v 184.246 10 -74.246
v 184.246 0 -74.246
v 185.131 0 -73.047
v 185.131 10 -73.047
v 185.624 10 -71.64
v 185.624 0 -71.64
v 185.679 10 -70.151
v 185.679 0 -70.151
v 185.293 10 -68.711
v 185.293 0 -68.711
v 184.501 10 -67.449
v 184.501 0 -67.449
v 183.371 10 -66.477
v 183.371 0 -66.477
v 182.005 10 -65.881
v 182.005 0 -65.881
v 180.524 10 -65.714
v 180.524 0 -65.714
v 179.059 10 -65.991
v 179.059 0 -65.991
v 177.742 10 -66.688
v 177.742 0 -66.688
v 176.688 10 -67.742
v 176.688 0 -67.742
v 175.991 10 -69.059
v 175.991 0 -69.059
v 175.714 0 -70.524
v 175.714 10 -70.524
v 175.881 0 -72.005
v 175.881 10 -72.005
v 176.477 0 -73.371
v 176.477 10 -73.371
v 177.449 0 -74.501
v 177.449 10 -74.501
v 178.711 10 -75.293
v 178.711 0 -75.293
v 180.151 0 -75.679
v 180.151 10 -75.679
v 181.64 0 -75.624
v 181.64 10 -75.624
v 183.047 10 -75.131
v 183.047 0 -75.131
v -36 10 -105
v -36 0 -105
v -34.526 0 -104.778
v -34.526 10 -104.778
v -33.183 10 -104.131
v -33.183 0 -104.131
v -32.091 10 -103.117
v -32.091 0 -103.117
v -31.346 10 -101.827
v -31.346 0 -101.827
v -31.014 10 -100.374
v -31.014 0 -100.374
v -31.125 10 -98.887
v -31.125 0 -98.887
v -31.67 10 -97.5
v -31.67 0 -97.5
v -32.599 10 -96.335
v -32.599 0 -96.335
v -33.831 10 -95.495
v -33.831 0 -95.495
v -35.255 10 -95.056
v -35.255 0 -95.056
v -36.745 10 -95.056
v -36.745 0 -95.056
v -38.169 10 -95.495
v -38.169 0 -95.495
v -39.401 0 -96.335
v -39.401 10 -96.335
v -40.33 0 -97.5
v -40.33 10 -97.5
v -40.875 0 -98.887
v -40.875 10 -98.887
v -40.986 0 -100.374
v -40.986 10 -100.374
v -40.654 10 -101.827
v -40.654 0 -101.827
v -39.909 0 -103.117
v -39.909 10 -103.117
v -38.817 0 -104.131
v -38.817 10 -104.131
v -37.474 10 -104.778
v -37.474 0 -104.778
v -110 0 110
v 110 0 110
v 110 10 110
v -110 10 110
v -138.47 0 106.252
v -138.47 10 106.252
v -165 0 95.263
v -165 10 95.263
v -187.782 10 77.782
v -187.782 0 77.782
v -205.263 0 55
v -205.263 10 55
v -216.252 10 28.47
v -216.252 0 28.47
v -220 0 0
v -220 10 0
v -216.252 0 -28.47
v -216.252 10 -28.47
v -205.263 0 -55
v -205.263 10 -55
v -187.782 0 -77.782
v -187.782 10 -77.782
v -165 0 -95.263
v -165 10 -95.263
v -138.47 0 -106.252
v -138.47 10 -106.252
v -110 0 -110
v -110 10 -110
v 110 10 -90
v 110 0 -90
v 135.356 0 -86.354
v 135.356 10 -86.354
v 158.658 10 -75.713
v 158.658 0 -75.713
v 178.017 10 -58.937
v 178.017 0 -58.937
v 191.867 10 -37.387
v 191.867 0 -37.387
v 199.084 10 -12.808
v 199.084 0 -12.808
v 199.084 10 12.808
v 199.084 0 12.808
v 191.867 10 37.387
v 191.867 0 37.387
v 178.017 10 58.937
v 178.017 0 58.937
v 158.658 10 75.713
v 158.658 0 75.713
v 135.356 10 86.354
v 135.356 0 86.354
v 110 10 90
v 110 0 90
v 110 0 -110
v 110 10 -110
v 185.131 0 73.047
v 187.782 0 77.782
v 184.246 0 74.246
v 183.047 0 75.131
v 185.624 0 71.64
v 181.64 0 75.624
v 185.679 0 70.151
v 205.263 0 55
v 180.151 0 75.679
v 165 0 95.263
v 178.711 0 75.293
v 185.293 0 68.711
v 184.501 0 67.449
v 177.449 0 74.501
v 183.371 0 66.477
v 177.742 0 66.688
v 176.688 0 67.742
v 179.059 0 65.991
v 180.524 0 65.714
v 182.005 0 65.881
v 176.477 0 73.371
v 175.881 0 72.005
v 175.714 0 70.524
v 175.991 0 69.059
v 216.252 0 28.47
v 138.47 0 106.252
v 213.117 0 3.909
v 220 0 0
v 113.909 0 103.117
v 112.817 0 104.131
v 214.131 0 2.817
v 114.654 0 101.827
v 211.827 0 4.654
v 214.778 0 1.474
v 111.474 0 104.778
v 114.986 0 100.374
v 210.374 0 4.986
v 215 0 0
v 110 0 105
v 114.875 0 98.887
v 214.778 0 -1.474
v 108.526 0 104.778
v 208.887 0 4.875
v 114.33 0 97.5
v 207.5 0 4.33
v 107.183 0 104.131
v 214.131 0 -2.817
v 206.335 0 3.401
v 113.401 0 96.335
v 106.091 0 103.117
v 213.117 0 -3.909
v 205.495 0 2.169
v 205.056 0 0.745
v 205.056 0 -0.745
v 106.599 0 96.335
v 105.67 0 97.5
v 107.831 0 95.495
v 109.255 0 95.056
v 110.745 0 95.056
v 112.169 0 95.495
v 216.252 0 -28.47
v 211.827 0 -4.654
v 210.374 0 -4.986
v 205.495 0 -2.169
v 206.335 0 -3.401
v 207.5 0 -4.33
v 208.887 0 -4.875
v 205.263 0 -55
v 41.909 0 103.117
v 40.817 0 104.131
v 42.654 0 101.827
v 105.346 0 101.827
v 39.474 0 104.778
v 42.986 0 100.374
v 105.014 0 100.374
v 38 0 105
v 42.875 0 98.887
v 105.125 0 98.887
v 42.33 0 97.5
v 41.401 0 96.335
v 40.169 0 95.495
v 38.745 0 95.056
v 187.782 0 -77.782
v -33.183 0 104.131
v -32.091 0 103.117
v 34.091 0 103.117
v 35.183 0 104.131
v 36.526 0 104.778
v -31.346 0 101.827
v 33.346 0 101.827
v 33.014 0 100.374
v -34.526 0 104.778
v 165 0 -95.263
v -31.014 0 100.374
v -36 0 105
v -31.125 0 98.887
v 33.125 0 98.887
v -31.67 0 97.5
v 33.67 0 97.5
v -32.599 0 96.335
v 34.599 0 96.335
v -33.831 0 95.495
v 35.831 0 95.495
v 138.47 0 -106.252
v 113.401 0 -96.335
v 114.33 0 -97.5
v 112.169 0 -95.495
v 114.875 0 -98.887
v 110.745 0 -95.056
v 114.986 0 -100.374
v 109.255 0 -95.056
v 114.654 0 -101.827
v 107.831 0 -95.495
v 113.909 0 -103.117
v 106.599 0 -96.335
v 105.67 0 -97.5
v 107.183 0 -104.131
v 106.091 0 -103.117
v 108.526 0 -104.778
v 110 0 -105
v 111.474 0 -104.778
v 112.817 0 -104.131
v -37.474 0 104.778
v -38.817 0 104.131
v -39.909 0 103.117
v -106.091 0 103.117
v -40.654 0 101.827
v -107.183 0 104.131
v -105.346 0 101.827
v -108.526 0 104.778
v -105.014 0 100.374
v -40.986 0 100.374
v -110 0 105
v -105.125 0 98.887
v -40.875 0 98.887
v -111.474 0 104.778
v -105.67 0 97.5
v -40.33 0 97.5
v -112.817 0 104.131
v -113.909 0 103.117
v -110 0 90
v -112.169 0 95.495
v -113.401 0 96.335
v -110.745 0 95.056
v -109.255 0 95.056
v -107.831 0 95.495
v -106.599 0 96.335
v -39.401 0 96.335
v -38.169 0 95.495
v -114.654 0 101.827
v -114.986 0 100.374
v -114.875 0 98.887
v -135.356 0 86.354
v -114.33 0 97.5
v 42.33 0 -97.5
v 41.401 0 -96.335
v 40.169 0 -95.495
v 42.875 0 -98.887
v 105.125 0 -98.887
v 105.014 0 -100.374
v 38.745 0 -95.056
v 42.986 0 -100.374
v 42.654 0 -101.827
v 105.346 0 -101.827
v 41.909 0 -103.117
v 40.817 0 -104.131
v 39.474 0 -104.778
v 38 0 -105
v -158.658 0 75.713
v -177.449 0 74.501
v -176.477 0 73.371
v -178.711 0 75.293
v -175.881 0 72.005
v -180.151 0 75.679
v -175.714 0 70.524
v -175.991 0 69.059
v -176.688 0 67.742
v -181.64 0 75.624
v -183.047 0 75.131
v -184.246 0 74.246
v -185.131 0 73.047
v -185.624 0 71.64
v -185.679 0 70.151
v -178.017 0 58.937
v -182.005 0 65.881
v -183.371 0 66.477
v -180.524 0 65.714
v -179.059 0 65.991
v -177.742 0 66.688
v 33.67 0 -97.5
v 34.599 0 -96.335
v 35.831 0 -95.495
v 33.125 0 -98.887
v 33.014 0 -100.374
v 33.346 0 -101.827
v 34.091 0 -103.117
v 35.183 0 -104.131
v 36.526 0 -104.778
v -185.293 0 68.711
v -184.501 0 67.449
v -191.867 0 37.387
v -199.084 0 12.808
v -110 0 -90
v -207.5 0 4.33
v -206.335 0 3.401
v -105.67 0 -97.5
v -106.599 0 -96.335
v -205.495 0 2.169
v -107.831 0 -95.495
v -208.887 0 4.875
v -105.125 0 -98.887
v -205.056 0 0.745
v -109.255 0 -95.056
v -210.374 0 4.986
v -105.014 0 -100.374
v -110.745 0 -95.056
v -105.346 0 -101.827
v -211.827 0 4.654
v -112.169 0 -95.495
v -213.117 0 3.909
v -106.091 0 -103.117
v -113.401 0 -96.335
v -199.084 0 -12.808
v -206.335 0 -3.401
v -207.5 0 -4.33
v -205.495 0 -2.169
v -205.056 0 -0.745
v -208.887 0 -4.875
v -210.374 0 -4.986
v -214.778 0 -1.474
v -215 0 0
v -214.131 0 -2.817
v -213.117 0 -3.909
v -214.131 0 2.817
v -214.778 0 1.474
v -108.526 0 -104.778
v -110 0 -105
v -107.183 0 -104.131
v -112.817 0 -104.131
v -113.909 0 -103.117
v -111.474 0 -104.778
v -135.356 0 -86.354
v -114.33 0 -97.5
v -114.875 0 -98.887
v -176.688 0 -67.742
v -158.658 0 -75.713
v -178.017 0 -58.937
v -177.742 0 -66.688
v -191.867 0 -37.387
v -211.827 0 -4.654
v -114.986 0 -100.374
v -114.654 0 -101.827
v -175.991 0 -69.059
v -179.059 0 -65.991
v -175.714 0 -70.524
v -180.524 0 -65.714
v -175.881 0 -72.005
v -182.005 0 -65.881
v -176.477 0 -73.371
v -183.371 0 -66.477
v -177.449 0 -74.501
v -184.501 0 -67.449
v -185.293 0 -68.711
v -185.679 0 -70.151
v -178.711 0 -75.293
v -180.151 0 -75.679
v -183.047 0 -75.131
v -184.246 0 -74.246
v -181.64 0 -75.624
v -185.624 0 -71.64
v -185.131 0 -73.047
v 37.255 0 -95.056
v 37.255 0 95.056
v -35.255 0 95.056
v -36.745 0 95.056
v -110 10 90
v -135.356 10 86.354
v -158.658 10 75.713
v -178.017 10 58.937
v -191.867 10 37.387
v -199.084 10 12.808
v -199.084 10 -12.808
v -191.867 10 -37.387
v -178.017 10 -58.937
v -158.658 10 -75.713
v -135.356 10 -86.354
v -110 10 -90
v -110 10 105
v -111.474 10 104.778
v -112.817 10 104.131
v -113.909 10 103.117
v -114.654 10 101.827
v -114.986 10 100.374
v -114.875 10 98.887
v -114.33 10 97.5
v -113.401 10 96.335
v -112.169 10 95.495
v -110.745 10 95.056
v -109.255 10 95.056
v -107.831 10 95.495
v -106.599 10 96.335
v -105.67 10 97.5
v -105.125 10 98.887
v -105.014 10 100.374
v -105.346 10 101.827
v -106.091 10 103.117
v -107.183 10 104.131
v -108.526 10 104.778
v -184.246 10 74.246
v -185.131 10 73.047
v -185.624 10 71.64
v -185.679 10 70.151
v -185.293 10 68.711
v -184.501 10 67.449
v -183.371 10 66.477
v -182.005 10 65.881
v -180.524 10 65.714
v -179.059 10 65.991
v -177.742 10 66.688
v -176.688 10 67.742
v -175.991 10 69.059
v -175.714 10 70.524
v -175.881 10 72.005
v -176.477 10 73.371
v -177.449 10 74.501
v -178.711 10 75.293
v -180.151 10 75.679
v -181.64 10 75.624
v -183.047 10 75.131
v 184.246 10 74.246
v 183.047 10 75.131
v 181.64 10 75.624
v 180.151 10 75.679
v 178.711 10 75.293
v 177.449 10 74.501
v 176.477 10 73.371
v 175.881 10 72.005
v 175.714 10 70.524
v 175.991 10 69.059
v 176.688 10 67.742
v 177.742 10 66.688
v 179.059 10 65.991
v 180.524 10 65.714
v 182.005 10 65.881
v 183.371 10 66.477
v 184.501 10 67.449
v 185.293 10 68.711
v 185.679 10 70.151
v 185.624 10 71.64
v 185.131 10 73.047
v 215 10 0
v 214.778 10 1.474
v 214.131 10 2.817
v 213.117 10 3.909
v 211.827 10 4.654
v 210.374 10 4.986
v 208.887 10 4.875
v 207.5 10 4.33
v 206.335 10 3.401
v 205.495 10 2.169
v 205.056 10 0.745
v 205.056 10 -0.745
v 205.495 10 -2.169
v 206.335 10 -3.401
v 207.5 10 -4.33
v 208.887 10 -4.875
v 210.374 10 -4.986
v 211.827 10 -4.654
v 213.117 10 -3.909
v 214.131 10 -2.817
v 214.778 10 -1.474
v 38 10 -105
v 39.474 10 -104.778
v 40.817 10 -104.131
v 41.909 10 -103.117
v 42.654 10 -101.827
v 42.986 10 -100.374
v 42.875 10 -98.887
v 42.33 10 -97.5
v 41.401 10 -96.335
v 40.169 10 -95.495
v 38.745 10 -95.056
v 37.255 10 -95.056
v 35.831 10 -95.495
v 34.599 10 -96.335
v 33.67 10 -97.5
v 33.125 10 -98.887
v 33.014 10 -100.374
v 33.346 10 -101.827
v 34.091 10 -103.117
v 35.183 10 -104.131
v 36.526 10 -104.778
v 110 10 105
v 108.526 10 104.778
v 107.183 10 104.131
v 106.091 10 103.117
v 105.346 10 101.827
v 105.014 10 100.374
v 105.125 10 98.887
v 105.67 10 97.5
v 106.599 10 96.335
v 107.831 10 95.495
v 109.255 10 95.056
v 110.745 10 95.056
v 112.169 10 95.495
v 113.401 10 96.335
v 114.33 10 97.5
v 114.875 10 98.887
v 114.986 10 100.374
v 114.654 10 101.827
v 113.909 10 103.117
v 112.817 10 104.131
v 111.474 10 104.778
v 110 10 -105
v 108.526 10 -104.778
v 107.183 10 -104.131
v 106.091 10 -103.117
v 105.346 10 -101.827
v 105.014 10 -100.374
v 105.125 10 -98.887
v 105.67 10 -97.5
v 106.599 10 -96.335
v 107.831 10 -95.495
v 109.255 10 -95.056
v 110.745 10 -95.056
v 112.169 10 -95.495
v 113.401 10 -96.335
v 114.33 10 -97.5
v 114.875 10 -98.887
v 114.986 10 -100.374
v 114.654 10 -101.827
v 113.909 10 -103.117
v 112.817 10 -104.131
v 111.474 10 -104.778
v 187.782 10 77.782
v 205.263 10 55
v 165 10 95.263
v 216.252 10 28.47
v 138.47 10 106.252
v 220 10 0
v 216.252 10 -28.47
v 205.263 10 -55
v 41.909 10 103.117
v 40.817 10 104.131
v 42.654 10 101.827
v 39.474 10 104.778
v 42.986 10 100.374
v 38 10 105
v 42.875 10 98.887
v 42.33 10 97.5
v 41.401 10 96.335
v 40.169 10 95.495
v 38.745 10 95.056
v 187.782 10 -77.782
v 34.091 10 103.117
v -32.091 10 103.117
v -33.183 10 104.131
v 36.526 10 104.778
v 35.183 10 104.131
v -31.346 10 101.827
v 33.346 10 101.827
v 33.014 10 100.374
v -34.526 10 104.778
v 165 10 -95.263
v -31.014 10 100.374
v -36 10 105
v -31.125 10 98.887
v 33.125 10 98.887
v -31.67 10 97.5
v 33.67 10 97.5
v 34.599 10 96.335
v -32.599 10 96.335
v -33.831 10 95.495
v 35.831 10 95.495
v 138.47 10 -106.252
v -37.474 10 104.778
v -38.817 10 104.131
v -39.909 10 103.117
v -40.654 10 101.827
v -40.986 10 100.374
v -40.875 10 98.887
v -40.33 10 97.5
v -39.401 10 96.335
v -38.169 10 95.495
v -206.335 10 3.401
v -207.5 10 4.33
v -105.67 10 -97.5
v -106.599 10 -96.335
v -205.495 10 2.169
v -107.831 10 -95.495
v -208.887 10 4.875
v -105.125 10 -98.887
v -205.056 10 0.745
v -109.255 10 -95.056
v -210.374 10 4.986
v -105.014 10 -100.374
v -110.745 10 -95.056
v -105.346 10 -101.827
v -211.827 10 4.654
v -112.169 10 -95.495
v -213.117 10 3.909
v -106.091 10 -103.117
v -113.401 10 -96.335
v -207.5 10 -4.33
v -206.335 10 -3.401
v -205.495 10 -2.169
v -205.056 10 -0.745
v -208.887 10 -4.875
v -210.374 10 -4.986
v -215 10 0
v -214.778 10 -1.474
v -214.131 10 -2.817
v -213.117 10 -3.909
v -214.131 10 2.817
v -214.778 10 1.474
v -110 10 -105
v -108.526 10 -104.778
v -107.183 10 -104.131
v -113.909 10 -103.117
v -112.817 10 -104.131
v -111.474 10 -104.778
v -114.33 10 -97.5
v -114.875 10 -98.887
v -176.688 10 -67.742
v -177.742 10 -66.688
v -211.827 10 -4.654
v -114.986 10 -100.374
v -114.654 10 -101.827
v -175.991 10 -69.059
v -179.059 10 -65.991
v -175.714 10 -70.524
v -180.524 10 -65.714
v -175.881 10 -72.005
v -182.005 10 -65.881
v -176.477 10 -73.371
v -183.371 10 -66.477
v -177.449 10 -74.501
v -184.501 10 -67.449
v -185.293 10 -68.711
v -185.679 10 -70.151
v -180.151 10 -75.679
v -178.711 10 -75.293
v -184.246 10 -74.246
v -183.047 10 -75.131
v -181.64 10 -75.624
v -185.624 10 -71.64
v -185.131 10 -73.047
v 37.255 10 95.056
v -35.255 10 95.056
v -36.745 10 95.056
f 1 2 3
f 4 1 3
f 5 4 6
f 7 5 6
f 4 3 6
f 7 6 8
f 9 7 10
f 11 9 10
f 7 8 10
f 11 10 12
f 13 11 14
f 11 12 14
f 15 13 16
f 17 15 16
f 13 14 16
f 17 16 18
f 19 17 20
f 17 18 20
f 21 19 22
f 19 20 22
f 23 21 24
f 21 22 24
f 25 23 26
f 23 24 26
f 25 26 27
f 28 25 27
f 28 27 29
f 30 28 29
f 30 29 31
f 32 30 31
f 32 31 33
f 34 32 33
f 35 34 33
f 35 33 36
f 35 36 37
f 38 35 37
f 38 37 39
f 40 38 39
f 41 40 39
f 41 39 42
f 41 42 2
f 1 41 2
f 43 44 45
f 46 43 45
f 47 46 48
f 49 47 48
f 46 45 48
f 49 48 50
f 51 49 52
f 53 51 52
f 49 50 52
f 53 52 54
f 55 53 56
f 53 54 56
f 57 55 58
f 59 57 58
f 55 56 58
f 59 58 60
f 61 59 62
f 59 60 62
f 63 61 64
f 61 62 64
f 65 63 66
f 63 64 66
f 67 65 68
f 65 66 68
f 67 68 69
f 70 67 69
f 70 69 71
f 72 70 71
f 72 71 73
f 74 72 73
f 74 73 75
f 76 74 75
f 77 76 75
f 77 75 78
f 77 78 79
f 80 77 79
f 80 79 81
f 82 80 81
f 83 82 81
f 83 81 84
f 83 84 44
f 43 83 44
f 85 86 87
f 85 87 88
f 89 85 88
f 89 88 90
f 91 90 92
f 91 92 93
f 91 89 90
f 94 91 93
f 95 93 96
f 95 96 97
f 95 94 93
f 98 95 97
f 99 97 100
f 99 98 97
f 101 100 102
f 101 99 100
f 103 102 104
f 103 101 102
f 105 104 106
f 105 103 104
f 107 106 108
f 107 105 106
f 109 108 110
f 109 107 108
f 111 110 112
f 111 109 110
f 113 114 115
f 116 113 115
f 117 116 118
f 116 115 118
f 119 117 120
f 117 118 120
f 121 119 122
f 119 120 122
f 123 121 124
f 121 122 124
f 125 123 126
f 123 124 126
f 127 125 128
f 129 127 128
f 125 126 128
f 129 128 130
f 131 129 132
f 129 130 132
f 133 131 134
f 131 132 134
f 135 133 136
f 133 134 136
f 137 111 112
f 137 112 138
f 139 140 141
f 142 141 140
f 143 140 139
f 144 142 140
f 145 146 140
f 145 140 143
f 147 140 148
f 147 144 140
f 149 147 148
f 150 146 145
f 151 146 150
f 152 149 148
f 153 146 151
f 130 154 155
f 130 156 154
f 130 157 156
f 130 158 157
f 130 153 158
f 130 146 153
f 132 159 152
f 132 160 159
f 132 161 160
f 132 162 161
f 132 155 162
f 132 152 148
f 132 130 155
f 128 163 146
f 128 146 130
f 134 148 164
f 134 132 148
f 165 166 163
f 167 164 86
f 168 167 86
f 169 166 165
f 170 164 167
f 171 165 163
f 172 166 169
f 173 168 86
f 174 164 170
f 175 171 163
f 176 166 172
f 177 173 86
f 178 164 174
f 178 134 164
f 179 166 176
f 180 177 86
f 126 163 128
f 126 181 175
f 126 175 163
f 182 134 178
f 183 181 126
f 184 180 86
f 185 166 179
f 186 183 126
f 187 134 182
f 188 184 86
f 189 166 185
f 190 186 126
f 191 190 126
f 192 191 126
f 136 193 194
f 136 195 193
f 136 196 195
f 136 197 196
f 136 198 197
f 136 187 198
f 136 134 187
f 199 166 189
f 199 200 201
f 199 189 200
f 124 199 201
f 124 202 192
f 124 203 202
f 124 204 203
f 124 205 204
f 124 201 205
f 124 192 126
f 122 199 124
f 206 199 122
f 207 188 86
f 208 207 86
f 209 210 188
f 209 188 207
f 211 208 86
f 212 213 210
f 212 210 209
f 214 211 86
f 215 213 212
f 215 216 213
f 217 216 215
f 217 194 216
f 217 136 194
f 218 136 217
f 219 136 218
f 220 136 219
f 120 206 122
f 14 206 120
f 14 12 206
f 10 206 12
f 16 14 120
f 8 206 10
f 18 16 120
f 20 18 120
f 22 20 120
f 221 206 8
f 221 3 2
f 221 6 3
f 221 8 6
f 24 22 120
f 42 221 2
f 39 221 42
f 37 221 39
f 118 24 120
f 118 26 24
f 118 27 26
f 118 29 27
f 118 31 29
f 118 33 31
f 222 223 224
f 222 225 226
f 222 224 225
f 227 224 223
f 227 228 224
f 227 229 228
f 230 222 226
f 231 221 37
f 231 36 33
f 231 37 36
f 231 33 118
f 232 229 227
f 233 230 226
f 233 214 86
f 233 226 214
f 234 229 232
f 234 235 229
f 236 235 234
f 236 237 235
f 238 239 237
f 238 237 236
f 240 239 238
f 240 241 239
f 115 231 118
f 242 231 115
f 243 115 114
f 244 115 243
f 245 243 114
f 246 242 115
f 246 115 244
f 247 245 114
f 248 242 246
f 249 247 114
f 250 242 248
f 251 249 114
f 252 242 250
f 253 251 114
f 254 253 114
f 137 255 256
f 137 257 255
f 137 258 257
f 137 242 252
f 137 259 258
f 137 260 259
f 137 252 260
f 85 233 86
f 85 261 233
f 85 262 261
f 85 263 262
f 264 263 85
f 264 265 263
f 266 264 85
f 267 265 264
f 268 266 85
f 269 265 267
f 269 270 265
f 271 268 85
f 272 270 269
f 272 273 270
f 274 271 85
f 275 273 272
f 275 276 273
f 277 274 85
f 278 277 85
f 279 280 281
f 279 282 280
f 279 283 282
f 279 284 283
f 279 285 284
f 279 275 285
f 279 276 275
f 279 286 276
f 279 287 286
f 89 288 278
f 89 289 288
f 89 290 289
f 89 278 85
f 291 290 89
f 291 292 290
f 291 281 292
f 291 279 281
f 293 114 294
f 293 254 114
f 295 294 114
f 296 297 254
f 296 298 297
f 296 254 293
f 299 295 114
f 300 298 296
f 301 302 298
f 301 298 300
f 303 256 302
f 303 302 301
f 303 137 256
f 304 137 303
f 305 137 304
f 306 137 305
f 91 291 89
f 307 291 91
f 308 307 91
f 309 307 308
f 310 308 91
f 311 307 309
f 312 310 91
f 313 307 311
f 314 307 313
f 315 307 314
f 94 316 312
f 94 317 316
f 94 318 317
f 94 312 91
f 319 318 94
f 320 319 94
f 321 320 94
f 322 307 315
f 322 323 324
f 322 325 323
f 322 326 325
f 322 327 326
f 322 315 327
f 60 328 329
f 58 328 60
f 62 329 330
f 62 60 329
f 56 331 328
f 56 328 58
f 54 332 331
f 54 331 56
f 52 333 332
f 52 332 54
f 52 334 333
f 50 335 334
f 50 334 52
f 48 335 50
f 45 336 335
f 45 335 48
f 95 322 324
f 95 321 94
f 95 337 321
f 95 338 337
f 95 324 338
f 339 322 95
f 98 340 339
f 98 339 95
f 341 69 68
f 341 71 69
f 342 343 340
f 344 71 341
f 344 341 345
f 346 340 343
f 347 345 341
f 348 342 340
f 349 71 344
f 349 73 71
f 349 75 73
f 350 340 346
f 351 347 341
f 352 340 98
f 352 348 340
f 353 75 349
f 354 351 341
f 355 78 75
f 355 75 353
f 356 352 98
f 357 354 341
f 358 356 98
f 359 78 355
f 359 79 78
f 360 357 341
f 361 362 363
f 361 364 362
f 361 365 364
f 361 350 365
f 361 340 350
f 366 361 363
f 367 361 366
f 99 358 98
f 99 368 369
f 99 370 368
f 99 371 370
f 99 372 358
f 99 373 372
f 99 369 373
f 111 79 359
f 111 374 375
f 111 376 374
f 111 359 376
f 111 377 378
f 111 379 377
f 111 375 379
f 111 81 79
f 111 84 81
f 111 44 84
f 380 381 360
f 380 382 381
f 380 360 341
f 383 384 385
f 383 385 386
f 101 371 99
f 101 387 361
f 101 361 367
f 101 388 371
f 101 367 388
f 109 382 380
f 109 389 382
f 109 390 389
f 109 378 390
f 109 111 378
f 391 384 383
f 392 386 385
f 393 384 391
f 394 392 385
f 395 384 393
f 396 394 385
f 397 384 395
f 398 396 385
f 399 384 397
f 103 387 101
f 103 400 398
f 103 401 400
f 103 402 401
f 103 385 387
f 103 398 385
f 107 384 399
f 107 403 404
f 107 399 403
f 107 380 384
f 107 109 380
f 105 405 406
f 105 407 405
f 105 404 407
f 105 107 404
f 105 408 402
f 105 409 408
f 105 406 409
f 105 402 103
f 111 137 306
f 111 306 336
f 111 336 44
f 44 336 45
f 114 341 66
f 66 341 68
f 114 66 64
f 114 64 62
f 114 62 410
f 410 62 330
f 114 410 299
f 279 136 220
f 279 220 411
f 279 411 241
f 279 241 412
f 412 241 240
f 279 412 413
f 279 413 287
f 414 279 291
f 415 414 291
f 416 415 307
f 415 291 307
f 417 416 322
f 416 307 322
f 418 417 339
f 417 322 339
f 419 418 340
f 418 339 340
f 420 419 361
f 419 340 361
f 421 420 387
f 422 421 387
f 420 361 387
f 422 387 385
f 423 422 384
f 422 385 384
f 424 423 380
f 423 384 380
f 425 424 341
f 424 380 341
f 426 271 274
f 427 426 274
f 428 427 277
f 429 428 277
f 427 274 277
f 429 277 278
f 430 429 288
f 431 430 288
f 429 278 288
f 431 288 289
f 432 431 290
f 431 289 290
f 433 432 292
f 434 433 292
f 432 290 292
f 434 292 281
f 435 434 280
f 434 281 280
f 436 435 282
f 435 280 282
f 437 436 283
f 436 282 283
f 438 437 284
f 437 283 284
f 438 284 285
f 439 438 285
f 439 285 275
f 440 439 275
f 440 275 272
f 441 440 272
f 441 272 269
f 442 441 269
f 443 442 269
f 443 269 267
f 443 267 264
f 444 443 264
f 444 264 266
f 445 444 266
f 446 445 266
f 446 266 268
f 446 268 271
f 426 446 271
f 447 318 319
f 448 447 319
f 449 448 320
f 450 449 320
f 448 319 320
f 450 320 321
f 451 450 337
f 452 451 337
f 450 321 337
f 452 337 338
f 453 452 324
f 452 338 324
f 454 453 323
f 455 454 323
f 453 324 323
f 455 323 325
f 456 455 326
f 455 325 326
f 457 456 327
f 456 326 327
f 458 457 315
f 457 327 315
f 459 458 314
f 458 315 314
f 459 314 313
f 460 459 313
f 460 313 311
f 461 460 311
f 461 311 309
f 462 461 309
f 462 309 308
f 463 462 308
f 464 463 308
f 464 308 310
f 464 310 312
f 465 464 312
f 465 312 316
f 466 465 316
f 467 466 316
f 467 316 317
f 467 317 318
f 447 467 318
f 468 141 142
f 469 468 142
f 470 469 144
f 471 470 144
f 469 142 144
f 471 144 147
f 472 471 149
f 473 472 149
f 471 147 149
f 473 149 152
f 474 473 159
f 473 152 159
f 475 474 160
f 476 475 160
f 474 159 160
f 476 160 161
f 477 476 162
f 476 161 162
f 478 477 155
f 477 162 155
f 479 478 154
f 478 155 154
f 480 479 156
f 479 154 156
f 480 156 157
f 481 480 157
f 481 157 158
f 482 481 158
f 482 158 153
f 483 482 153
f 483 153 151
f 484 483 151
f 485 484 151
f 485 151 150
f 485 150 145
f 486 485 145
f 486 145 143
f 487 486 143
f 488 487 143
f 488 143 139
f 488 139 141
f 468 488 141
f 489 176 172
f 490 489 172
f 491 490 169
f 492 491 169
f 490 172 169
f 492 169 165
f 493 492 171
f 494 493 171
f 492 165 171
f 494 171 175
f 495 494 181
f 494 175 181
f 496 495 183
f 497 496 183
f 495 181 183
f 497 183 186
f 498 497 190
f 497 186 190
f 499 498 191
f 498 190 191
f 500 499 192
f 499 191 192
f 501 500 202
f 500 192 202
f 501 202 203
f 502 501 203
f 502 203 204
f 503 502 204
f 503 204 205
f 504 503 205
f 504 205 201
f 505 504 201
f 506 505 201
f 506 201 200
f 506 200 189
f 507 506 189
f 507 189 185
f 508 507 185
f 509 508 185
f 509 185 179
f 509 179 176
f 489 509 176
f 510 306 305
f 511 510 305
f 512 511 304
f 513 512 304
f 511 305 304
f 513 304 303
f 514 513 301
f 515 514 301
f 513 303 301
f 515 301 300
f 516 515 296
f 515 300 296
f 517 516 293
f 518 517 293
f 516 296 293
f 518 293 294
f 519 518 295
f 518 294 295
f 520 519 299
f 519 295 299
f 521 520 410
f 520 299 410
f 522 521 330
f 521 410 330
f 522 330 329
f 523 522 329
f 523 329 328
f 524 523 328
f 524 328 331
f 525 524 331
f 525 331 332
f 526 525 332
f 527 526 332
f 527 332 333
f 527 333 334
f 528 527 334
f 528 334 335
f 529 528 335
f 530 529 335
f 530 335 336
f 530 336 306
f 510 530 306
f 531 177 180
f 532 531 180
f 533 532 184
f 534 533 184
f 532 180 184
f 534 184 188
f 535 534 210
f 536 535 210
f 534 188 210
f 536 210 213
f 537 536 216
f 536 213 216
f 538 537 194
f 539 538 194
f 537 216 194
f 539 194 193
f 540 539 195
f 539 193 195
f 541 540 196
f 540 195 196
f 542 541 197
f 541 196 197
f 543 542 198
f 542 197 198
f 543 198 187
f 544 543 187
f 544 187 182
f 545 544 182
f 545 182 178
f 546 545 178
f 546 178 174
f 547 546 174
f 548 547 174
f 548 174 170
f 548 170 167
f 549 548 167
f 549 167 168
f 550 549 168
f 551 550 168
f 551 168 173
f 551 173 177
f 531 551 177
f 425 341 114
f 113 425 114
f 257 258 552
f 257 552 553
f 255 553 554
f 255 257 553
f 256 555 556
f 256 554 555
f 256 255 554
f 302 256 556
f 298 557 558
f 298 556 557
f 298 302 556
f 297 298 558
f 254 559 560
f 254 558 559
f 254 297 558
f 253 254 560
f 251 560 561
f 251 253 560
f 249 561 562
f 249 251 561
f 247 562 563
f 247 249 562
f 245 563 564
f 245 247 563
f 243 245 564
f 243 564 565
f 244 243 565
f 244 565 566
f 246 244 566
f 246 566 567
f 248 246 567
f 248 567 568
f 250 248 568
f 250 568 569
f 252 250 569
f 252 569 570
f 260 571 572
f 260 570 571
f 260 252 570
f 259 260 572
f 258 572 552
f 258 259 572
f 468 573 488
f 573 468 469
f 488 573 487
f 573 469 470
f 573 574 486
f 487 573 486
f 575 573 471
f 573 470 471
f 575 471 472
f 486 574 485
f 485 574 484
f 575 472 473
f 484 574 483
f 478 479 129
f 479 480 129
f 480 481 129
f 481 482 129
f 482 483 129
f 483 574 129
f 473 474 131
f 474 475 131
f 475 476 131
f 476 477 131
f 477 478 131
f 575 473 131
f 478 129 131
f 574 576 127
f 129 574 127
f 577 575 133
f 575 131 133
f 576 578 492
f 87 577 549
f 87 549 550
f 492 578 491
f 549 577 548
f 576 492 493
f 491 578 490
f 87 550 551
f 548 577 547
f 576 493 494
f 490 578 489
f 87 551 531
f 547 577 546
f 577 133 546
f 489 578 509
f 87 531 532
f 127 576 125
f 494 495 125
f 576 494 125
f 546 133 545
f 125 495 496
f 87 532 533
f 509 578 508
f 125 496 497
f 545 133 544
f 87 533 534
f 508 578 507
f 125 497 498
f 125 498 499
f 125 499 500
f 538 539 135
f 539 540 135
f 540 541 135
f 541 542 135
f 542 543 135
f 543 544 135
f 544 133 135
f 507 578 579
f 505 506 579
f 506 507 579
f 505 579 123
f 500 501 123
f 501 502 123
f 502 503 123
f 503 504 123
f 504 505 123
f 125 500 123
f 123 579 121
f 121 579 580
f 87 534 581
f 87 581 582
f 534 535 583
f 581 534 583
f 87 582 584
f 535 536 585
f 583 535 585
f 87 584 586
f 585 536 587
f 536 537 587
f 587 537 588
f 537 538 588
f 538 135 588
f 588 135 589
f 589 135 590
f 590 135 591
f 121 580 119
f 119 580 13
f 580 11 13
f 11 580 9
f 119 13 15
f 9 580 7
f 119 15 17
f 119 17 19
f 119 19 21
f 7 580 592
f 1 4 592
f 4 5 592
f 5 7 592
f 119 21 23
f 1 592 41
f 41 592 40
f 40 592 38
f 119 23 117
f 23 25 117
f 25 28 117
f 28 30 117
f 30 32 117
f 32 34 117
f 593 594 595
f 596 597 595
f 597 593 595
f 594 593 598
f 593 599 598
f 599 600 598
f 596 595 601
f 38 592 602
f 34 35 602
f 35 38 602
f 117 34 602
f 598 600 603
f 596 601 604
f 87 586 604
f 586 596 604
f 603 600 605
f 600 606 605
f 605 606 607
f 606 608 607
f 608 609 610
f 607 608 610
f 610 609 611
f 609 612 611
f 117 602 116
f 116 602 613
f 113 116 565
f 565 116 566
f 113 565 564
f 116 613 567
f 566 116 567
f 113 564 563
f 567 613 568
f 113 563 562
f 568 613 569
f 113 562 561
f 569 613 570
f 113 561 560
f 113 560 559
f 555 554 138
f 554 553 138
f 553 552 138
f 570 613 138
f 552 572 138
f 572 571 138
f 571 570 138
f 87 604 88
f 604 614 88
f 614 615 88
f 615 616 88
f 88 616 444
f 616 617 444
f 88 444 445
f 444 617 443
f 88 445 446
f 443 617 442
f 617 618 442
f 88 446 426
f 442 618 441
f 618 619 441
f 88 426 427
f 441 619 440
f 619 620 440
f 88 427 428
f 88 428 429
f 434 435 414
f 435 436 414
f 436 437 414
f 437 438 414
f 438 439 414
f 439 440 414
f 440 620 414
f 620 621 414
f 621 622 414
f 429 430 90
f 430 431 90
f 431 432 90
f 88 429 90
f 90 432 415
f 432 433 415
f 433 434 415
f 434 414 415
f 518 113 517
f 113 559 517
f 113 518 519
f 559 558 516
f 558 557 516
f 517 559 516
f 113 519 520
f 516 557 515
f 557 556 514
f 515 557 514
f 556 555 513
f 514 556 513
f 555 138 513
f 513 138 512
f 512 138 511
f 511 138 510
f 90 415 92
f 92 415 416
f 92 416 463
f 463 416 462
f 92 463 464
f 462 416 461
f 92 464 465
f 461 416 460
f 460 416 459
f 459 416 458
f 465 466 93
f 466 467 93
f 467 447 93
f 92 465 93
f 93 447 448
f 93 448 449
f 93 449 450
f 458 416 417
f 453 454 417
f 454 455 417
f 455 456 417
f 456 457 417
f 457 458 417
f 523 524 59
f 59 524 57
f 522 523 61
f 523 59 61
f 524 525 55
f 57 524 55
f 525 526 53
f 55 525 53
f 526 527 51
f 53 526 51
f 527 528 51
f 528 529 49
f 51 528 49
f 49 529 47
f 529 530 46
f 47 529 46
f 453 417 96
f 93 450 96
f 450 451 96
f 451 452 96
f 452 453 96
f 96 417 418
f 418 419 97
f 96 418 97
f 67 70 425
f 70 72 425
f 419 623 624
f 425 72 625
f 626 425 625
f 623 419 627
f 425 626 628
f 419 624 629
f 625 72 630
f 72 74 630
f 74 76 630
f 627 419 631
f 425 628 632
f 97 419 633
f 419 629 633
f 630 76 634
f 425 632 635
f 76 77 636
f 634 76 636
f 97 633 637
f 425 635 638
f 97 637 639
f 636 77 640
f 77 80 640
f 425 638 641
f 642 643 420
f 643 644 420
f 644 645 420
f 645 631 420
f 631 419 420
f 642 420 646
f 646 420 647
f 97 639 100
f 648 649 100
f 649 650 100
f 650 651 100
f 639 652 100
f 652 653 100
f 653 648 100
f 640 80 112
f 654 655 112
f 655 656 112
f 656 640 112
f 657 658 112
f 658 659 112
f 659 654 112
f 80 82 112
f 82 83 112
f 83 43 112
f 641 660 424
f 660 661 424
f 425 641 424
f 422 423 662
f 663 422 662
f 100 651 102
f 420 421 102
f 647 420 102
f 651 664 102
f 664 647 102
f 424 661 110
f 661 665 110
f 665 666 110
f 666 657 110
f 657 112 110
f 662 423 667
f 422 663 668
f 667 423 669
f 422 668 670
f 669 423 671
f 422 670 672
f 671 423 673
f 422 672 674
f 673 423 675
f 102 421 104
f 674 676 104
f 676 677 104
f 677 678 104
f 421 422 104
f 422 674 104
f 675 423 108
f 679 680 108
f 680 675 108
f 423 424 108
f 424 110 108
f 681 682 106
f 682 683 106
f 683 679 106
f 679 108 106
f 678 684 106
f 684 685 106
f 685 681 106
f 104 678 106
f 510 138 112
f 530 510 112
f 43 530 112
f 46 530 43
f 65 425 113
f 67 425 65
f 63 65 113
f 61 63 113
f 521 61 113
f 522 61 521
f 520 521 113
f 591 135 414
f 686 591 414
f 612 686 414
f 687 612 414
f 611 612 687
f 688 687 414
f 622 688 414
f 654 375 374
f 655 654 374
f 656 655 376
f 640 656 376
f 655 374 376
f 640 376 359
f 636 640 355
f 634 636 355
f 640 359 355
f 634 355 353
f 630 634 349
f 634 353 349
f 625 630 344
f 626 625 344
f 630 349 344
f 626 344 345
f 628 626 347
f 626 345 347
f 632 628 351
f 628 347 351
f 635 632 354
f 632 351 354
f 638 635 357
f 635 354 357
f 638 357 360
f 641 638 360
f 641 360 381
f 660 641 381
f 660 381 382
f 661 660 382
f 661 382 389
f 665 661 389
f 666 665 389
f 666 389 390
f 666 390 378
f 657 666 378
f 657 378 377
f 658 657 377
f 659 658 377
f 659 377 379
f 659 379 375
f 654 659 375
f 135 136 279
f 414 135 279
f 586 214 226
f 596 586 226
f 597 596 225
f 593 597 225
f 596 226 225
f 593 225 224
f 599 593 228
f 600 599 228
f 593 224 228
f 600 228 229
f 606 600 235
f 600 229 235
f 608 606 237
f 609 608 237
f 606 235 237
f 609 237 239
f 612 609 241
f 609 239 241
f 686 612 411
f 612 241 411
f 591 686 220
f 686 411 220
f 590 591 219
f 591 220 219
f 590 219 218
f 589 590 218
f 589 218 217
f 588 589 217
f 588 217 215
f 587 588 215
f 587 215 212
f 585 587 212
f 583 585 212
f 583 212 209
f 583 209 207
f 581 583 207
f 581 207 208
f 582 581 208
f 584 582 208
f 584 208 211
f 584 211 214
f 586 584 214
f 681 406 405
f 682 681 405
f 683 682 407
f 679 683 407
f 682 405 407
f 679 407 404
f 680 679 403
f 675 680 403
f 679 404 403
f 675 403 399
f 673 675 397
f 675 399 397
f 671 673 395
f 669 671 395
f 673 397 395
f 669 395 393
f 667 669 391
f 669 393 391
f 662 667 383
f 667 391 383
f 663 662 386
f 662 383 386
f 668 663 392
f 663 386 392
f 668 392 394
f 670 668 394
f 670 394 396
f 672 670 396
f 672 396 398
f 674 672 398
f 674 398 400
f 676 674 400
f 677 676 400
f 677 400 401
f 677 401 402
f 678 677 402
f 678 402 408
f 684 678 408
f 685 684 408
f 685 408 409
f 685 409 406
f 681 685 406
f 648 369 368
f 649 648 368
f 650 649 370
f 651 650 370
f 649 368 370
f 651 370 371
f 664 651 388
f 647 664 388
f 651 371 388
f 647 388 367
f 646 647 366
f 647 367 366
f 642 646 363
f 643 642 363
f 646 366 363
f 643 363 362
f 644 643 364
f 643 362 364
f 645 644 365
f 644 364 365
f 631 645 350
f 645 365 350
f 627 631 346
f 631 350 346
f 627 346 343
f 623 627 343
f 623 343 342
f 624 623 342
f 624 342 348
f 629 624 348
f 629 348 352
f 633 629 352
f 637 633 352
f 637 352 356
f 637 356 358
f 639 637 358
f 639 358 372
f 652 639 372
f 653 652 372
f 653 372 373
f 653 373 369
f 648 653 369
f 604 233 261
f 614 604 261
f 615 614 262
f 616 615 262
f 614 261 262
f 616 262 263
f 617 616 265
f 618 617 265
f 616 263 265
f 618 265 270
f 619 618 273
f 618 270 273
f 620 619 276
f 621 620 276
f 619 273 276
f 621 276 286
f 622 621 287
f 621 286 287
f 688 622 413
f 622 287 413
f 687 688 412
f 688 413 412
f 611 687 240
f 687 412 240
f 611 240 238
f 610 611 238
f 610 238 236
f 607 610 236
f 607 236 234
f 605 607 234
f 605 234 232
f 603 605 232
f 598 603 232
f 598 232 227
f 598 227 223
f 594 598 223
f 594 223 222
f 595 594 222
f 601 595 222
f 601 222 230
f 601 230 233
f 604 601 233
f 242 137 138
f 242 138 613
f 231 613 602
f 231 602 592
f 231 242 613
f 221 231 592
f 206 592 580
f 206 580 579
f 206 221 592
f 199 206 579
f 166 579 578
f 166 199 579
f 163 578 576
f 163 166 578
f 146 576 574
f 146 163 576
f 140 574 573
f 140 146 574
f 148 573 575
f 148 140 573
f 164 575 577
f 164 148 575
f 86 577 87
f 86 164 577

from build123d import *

# Parameters (mm, degrees)
BOSS_EXTRUDE1_DEPTH    = 10
F_10_0MM_DOWEL_HOLE6_D = 10
CIRPATTERN2_COUNT      = 5
CIRPATTERN2_ANGLE      = 180
MIRROR2_COPY_1_D       = 10
MIRROR2_COPY_2_D       = 10
MIRROR2_COPY_3_D       = 10
MIRROR2_COPY_4_D       = 10
LPATTERN1_COUNT        = 3
LPATTERN1_PITCH        = 74
MIRROR3_COPY_1_D       = 10
MIRROR3_COPY_2_D       = 10
MIRROR3_COPY_3_D       = 10


with BuildPart() as part:
    # Sketch1 → Boss-Extrude1 (new body)
    with BuildSketch(Plane(origin=(0, 0, 0), x_dir=(1, 0, 0), z_dir=(0, 1, 0))):
        with BuildLine():
            Line((-110, 110), (110, 110))
            ThreePointArc((110, 110), (220, 0), (110, -110))
            Line((110, -110), (-110, -110))
            ThreePointArc((-110, -110), (-220, 0), (-110, 110))
        make_face()
        with BuildLine():
            Line((-110, 90), (110, 90))
            ThreePointArc((110, 90), (200, 0), (110, -90))
            Line((110, -90), (-110, -90))
            ThreePointArc((-110, -90), (-200, 0), (-110, 90))
        make_face(mode=Mode.SUBTRACT)
    extrude(amount=BOSS_EXTRUDE1_DEPTH)

    # Ø10.0mm Dowel Hole6 (through all)
    with Locations(Plane(origin=(-110, 10, -100), x_dir=(0, 0, 1), z_dir=(0, 1, 0))):
        with Locations((0, 0)):
            f_10_0mm_dowel_hole6 = Hole(F_10_0MM_DOWEL_HOLE6_D / 2)

    # CirPattern2: Ø10.0mm Dowel Hole6 ×5 about axis
    cirpattern2_axis = Axis((-110, 0, 0), (0, 1, 0))
    for i in range(1, CIRPATTERN2_COUNT):
        add(f_10_0mm_dowel_hole6.rotate(cirpattern2_axis, i * CIRPATTERN2_ANGLE / (CIRPATTERN2_COUNT - 1)), mode=Mode.SUBTRACT)

    # Mirror2: Ø10.0mm Dowel Hole6 across plane
    add(f_10_0mm_dowel_hole6.mirror(Plane(origin=(0, 0, 0), x_dir=(0, 0, 1), z_dir=(1, 0, 0))), mode=Mode.SUBTRACT)

    # Mirror2 copy 1 (through all)
    with Locations(Plane(origin=(180.710678119, 10, -70.710678119), x_dir=(-0.707106781, 0, 0.707106781), z_dir=(0, 1, 0))):
        with Locations((0, 0)):
            Hole(MIRROR2_COPY_1_D / 2)

    # Mirror2 copy 2 (through all)
    with Locations(Plane(origin=(210, 10, 0), x_dir=(-1, 0, 0), z_dir=(0, 1, 0))):
        with Locations((0, 0)):
            Hole(MIRROR2_COPY_2_D / 2)

    # Mirror2 copy 3 (through all)
    with Locations(Plane(origin=(180.710678119, 10, 70.710678119), x_dir=(-0.707106781, 0, -0.707106781), z_dir=(0, 1, 0))):
        with Locations((0, 0)):
            Hole(MIRROR2_COPY_3_D / 2)

    # Mirror2 copy 4 (through all)
    with Locations(Plane(origin=(110, 10, 100), x_dir=(0, 0, -1), z_dir=(0, 1, 0))):
        with Locations((0, 0)):
            Hole(MIRROR2_COPY_4_D / 2)

    # LPattern1: Ø10.0mm Dowel Hole6 ×3
    with Locations(*[(i * LPATTERN1_PITCH, 0, 0) for i in range(1, LPATTERN1_COUNT)]):
        add(f_10_0mm_dowel_hole6, mode=Mode.SUBTRACT)

    # Mirror3 copy 1 (through all)
    with Locations(Plane(origin=(-36, 10, 100), x_dir=(0, 0, -1), z_dir=(0, 1, 0))):
        with Locations((0, 0)):
            Hole(MIRROR3_COPY_1_D / 2)

    # Mirror3 copy 2 (through all)
    with Locations(Plane(origin=(38, 10, 100), x_dir=(0, 0, -1), z_dir=(0, 1, 0))):
        with Locations((0, 0)):
            Hole(MIRROR3_COPY_2_D / 2)

    # Mirror3 copy 3 (through all)
    with Locations(Plane(origin=(-110, 10, 100), x_dir=(0, 0, -1), z_dir=(0, 1, 0))):
        with Locations((0, 0)):
            Hole(MIRROR3_COPY_3_D / 2)


solid = part.part
